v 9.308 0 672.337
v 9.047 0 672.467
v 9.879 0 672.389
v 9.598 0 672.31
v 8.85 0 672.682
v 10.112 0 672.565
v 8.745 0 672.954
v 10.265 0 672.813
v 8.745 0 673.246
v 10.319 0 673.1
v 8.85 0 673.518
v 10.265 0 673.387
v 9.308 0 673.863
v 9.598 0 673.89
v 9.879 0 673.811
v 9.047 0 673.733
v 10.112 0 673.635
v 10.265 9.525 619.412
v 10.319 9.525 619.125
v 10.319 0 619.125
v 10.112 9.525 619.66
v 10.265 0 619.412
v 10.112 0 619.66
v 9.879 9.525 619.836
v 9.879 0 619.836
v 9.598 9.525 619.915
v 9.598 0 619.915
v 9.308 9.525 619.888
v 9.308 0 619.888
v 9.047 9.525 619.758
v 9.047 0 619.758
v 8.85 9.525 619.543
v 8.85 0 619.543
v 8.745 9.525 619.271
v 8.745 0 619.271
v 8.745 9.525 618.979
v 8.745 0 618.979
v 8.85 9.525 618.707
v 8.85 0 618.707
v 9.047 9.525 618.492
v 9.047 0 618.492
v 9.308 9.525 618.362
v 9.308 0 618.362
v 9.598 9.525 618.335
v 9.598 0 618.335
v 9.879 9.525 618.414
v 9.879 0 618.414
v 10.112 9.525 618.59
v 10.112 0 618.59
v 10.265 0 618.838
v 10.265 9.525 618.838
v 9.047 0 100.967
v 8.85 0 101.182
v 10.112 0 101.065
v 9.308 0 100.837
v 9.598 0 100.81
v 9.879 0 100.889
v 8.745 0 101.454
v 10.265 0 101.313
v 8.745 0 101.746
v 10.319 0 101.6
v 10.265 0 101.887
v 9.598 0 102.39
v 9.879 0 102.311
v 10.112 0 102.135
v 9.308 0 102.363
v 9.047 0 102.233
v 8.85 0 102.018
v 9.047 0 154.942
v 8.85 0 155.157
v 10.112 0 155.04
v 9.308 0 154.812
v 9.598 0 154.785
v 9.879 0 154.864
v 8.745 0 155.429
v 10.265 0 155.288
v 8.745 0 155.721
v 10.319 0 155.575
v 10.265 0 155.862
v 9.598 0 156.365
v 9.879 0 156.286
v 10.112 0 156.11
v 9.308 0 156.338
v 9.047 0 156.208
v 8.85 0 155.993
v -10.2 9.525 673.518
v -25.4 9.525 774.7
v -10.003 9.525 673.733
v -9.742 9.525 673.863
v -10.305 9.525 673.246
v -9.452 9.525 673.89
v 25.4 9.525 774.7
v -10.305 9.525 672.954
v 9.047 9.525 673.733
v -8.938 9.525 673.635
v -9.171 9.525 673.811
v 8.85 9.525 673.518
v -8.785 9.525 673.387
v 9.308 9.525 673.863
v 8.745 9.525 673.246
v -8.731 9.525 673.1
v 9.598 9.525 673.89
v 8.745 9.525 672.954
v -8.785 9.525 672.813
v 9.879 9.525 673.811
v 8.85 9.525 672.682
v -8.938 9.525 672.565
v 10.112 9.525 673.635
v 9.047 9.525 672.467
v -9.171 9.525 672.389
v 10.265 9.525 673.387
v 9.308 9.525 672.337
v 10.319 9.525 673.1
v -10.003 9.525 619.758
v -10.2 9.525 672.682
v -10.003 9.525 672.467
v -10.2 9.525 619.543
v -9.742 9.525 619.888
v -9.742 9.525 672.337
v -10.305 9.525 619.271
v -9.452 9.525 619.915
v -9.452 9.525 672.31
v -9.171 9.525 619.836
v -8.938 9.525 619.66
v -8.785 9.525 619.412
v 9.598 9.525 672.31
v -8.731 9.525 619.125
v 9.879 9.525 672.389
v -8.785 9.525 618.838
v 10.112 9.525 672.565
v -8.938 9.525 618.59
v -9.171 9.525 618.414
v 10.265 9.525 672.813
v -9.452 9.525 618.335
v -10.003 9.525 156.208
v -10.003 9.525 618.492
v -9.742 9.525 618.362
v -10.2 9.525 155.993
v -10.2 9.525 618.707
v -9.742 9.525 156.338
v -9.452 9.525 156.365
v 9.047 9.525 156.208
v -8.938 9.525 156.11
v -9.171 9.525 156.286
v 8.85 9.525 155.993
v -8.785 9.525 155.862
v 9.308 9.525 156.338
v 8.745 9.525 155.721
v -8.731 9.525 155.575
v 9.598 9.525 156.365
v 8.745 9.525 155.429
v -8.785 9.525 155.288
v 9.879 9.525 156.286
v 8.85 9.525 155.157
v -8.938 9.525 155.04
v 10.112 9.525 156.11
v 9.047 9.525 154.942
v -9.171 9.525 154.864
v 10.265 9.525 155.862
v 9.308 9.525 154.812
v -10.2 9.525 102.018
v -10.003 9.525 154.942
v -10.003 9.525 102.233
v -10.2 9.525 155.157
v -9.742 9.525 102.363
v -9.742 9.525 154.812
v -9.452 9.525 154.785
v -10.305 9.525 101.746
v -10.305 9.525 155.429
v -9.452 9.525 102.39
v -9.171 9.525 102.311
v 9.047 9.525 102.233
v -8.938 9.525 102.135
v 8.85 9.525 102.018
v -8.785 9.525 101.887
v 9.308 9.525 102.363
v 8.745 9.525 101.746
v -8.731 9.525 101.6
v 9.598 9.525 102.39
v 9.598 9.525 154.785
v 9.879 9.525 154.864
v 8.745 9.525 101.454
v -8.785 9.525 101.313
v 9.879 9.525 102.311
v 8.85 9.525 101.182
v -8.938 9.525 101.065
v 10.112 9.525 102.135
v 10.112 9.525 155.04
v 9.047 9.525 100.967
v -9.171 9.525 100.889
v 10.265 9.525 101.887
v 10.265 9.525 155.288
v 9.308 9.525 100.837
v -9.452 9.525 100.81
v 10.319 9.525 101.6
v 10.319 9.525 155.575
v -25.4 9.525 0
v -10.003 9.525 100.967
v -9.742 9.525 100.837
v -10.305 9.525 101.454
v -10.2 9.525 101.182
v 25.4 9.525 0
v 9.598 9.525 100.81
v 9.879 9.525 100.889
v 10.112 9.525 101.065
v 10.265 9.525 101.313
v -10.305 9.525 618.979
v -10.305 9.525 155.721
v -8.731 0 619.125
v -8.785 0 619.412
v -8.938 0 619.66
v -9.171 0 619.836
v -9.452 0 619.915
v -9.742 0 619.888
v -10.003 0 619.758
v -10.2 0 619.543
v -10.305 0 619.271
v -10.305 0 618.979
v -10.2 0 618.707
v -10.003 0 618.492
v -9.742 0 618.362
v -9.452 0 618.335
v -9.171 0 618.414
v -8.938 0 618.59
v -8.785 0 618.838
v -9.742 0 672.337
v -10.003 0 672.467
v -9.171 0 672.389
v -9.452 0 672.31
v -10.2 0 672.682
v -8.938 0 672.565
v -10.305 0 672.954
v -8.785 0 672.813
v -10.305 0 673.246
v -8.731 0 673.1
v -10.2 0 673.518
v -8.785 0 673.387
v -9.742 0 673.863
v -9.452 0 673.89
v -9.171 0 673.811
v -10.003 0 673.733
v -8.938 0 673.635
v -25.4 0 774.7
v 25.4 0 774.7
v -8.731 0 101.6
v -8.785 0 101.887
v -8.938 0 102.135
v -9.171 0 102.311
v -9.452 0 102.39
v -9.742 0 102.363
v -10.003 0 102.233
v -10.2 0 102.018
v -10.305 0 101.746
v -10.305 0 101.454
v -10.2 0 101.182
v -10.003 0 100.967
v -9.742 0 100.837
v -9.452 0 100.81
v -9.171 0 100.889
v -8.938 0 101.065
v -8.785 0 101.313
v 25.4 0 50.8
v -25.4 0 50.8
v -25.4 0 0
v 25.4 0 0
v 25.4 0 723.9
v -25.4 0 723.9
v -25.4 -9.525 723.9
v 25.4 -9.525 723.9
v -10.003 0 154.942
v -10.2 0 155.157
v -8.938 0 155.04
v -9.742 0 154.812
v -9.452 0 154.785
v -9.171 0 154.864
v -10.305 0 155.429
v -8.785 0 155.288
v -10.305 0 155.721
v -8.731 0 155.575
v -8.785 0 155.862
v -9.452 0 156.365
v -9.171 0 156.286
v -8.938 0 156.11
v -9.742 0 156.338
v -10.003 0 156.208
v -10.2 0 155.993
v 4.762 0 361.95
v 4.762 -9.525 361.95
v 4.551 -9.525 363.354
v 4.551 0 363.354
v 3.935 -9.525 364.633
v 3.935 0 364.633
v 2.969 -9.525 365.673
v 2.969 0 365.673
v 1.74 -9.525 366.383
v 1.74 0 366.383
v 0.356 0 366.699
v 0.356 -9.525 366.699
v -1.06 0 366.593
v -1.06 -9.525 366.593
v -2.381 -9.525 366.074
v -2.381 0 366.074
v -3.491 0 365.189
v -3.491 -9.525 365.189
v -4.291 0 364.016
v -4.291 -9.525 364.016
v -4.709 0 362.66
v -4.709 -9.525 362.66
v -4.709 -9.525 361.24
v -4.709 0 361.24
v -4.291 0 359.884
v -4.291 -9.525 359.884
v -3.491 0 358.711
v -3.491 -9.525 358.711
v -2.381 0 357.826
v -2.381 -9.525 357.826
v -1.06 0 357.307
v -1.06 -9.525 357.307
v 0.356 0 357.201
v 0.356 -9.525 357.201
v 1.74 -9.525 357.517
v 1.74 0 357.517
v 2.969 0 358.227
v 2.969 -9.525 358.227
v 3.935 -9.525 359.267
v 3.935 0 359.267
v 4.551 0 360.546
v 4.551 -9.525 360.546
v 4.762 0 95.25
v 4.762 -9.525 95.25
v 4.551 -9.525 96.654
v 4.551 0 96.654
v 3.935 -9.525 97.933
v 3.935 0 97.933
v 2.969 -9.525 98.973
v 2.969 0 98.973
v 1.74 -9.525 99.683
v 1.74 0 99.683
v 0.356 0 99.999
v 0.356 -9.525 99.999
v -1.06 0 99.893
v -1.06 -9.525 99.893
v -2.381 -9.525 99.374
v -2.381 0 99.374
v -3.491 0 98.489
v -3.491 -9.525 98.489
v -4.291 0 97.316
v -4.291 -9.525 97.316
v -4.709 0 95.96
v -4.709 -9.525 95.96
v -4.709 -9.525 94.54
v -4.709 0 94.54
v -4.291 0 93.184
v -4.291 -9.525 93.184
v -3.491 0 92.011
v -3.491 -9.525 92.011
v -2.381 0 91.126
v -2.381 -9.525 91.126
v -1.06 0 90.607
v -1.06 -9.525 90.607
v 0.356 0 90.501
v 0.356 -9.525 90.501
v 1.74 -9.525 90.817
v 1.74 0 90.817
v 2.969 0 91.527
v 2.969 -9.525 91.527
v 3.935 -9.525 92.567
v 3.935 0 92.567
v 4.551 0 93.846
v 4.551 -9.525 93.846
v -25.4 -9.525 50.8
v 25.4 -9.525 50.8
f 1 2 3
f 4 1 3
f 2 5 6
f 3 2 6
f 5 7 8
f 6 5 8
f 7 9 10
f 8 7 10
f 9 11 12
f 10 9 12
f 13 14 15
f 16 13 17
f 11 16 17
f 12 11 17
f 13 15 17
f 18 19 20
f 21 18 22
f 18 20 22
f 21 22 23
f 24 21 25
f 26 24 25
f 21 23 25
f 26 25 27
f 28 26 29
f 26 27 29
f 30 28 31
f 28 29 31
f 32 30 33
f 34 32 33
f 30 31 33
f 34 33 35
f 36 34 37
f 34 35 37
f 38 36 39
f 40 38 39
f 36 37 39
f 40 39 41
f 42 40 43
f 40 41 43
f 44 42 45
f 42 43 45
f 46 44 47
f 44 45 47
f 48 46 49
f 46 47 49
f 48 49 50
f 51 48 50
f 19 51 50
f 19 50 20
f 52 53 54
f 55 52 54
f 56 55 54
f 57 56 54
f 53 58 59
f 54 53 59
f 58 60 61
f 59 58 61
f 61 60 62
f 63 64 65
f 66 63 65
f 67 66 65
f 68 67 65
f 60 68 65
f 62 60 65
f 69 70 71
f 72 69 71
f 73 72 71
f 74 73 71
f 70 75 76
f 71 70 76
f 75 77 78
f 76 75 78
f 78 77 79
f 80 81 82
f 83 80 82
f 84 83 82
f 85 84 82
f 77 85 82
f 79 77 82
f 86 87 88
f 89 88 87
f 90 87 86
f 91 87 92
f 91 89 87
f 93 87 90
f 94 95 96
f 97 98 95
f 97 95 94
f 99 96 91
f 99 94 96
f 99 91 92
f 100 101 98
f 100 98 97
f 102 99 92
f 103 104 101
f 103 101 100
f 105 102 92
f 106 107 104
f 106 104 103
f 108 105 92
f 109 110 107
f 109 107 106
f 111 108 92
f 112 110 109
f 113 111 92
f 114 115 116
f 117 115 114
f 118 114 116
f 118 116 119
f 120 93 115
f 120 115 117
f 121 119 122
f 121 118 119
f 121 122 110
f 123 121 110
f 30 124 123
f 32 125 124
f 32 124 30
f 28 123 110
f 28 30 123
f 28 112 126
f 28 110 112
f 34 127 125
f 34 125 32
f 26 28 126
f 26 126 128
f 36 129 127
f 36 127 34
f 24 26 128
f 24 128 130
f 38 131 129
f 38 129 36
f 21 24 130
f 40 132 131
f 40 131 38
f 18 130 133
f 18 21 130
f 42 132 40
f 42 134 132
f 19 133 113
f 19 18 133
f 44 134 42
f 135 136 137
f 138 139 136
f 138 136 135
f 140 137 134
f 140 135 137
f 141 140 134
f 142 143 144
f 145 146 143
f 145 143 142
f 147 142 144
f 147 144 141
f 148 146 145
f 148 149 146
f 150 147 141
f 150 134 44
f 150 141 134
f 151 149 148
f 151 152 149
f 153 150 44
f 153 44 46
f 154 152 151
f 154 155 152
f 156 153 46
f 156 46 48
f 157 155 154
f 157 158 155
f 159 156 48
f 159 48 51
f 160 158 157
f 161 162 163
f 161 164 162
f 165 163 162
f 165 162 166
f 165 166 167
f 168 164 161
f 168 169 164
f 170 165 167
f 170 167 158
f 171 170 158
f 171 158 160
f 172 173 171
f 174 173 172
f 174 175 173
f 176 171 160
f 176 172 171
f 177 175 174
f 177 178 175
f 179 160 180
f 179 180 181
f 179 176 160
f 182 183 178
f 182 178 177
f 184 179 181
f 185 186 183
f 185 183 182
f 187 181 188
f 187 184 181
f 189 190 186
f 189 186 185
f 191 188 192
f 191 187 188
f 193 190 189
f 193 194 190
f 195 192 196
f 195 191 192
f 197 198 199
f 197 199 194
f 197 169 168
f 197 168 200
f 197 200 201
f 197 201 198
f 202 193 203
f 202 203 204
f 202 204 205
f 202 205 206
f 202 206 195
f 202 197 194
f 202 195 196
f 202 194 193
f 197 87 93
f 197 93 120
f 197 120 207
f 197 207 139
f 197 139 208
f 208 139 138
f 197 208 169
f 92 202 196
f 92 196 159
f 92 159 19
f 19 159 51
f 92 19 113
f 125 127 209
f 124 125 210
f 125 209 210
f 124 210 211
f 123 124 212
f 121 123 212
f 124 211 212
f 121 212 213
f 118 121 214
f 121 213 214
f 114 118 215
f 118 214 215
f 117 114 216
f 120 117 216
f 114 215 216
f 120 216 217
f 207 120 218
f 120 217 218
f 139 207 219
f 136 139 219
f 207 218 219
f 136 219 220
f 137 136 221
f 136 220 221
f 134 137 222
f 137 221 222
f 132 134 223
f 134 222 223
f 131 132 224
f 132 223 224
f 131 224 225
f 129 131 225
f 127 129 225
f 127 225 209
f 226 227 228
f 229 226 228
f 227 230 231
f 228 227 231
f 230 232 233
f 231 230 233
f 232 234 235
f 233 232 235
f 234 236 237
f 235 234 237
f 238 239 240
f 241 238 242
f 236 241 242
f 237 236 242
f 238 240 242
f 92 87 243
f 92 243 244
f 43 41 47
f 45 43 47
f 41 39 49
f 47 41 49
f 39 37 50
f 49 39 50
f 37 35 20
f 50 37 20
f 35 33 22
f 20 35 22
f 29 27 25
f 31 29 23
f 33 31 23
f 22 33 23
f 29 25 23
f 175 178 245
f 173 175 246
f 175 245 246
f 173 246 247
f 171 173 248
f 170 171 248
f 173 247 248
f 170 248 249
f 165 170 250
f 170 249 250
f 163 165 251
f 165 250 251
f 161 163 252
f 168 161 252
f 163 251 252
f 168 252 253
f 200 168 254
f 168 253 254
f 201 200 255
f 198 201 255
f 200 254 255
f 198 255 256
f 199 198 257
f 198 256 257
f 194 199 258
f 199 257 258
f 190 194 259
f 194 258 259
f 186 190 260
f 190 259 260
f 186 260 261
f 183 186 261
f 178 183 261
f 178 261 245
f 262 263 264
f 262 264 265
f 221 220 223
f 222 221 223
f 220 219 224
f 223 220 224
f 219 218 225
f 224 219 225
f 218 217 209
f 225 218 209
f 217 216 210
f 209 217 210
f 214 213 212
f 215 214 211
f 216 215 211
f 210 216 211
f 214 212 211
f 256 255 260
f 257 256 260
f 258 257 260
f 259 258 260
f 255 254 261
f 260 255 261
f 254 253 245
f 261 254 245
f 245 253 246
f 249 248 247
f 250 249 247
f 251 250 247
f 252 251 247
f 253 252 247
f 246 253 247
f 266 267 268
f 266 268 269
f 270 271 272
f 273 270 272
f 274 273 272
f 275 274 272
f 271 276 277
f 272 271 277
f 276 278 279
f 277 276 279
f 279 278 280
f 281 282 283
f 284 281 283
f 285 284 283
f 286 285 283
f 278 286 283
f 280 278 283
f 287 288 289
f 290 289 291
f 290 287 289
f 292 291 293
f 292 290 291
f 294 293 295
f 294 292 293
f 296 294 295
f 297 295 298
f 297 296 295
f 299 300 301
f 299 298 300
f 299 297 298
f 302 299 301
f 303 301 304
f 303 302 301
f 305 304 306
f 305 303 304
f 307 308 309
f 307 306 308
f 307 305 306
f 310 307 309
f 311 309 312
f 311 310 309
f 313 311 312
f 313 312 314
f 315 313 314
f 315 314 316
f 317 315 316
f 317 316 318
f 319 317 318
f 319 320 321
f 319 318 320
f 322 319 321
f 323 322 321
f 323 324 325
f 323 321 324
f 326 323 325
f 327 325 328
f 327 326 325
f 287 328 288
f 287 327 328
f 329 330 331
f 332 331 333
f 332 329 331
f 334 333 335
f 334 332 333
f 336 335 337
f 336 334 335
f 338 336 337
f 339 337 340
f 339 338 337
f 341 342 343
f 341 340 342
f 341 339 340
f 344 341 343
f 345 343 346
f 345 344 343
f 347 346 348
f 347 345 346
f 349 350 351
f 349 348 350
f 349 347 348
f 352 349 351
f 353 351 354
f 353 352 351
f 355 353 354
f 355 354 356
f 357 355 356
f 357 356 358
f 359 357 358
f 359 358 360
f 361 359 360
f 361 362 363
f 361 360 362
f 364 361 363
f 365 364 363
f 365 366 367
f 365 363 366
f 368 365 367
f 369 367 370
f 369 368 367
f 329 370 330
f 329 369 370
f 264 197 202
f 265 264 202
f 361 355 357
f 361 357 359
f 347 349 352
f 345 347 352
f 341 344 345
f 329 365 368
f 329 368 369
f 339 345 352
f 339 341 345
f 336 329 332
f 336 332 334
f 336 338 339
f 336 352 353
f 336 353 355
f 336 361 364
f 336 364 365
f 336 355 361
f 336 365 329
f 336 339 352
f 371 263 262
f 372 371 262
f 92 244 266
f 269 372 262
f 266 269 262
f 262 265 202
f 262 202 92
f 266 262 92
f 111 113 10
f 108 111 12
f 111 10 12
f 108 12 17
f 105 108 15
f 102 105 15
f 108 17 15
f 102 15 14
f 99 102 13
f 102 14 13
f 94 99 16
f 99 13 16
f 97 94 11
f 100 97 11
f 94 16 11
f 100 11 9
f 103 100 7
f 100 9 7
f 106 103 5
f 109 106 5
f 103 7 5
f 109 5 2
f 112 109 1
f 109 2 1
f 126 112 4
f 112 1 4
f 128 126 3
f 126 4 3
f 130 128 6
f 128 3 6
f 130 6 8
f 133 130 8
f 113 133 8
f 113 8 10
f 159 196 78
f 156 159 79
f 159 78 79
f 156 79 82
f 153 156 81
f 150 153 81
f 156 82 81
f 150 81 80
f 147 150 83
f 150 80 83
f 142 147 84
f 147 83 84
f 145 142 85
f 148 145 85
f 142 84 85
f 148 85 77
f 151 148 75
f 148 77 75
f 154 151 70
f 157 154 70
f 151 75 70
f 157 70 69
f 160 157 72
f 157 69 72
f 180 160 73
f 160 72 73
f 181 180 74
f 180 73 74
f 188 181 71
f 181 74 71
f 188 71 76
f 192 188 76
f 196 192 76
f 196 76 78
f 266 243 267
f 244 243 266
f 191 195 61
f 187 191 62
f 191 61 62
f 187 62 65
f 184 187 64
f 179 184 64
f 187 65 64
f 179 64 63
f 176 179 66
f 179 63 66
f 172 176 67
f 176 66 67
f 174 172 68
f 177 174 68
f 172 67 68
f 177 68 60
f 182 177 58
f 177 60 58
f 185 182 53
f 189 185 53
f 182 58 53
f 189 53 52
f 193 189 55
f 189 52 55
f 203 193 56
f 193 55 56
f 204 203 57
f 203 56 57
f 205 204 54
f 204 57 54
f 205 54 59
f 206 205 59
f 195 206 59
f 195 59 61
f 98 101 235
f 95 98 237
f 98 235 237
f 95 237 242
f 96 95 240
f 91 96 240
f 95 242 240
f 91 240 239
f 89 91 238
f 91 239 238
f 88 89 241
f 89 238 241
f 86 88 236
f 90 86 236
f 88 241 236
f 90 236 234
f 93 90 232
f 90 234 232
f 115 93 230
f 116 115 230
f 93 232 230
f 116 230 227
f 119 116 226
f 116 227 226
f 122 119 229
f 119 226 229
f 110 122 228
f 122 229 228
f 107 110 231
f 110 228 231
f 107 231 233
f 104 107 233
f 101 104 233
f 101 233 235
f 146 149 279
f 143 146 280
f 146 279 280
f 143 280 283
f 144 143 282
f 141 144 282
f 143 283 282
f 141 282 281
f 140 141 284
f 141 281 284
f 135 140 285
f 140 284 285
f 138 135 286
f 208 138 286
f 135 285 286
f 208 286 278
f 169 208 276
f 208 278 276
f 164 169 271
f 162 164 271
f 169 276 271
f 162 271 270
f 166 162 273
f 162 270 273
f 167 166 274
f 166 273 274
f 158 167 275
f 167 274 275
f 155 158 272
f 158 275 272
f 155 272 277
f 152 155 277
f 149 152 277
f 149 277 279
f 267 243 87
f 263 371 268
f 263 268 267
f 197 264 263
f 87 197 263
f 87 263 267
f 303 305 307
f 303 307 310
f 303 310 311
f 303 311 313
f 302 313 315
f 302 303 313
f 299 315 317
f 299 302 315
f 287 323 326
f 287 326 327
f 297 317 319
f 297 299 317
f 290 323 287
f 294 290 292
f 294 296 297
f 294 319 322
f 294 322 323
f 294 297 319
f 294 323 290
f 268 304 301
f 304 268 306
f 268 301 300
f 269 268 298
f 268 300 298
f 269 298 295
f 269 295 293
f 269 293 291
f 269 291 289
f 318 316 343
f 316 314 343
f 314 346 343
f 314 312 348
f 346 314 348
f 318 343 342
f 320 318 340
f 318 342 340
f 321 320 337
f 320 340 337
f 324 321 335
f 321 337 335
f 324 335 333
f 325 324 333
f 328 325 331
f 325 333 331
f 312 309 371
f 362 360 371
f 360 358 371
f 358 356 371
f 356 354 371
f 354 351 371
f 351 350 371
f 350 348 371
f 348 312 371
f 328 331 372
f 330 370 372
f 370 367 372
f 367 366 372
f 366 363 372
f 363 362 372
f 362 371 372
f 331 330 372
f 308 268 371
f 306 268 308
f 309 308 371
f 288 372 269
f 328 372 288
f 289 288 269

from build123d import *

# Parameters (mm, degrees)
F0_W     = 50.8
F0_H     = 19.05
F1_DEPTH = 774.7
F2_W     = 122.43557321
F2_H     = 50.8
F2_W_2   = 343.1604206562
F3_DEPTH = 25.4
F4_R     = 0.79375
F5_DEPTH = 25.4
F6_R     = 4.7625
F7_DEPTH = 25.4


# Not quite as in the source:
# - a feature names something its author has since deleted; it is built from what else it names


with BuildPart() as f1:
    # F0 (on Top) → F1 (new body)
    with BuildSketch(Plane.XY):
        Rectangle(F0_W, F0_H)
    extrude(amount=F1_DEPTH)

    # F2 (on Front) → F3 (cut)
    with BuildSketch(Plane.XZ):
        with Locations((22.4465244144, 25.4)):
            Rectangle(F2_W, F2_H)
        with Locations((-38.7818217278, 749.3)):
            Rectangle(F2_W_2, F2_H)
    extrude(amount=F3_DEPTH, mode=Mode.SUBTRACT)

    # F4 (on Front) → F5 (cut)
    with BuildSketch(Plane.XZ):
        with Locations((9.525, 101.6)):
            Circle(F4_R)
        with Locations((9.525, 155.575)):
            Circle(F4_R)
        with Locations((9.525, 619.125)):
            Circle(F4_R)
        with Locations((9.525, 673.1)):
            Circle(F4_R)
        with Locations((-9.525, 619.125)):
            Circle(F4_R)
        with Locations((-9.525, 673.1)):
            Circle(F4_R)
        with Locations((-9.525, 101.6)):
            Circle(F4_R)
        with Locations((-9.525, 155.575)):
            Circle(F4_R)
    extrude(amount=-F5_DEPTH, mode=Mode.SUBTRACT)

    # F6 (on Front) → F7 (cut)
    with BuildSketch(Plane.XZ):
        with Locations((0, 95.25)):
            Circle(F6_R)
        with Locations((0, 361.95)):
            Circle(F6_R)
    extrude(amount=F7_DEPTH, mode=Mode.SUBTRACT)


solid = f1.part
